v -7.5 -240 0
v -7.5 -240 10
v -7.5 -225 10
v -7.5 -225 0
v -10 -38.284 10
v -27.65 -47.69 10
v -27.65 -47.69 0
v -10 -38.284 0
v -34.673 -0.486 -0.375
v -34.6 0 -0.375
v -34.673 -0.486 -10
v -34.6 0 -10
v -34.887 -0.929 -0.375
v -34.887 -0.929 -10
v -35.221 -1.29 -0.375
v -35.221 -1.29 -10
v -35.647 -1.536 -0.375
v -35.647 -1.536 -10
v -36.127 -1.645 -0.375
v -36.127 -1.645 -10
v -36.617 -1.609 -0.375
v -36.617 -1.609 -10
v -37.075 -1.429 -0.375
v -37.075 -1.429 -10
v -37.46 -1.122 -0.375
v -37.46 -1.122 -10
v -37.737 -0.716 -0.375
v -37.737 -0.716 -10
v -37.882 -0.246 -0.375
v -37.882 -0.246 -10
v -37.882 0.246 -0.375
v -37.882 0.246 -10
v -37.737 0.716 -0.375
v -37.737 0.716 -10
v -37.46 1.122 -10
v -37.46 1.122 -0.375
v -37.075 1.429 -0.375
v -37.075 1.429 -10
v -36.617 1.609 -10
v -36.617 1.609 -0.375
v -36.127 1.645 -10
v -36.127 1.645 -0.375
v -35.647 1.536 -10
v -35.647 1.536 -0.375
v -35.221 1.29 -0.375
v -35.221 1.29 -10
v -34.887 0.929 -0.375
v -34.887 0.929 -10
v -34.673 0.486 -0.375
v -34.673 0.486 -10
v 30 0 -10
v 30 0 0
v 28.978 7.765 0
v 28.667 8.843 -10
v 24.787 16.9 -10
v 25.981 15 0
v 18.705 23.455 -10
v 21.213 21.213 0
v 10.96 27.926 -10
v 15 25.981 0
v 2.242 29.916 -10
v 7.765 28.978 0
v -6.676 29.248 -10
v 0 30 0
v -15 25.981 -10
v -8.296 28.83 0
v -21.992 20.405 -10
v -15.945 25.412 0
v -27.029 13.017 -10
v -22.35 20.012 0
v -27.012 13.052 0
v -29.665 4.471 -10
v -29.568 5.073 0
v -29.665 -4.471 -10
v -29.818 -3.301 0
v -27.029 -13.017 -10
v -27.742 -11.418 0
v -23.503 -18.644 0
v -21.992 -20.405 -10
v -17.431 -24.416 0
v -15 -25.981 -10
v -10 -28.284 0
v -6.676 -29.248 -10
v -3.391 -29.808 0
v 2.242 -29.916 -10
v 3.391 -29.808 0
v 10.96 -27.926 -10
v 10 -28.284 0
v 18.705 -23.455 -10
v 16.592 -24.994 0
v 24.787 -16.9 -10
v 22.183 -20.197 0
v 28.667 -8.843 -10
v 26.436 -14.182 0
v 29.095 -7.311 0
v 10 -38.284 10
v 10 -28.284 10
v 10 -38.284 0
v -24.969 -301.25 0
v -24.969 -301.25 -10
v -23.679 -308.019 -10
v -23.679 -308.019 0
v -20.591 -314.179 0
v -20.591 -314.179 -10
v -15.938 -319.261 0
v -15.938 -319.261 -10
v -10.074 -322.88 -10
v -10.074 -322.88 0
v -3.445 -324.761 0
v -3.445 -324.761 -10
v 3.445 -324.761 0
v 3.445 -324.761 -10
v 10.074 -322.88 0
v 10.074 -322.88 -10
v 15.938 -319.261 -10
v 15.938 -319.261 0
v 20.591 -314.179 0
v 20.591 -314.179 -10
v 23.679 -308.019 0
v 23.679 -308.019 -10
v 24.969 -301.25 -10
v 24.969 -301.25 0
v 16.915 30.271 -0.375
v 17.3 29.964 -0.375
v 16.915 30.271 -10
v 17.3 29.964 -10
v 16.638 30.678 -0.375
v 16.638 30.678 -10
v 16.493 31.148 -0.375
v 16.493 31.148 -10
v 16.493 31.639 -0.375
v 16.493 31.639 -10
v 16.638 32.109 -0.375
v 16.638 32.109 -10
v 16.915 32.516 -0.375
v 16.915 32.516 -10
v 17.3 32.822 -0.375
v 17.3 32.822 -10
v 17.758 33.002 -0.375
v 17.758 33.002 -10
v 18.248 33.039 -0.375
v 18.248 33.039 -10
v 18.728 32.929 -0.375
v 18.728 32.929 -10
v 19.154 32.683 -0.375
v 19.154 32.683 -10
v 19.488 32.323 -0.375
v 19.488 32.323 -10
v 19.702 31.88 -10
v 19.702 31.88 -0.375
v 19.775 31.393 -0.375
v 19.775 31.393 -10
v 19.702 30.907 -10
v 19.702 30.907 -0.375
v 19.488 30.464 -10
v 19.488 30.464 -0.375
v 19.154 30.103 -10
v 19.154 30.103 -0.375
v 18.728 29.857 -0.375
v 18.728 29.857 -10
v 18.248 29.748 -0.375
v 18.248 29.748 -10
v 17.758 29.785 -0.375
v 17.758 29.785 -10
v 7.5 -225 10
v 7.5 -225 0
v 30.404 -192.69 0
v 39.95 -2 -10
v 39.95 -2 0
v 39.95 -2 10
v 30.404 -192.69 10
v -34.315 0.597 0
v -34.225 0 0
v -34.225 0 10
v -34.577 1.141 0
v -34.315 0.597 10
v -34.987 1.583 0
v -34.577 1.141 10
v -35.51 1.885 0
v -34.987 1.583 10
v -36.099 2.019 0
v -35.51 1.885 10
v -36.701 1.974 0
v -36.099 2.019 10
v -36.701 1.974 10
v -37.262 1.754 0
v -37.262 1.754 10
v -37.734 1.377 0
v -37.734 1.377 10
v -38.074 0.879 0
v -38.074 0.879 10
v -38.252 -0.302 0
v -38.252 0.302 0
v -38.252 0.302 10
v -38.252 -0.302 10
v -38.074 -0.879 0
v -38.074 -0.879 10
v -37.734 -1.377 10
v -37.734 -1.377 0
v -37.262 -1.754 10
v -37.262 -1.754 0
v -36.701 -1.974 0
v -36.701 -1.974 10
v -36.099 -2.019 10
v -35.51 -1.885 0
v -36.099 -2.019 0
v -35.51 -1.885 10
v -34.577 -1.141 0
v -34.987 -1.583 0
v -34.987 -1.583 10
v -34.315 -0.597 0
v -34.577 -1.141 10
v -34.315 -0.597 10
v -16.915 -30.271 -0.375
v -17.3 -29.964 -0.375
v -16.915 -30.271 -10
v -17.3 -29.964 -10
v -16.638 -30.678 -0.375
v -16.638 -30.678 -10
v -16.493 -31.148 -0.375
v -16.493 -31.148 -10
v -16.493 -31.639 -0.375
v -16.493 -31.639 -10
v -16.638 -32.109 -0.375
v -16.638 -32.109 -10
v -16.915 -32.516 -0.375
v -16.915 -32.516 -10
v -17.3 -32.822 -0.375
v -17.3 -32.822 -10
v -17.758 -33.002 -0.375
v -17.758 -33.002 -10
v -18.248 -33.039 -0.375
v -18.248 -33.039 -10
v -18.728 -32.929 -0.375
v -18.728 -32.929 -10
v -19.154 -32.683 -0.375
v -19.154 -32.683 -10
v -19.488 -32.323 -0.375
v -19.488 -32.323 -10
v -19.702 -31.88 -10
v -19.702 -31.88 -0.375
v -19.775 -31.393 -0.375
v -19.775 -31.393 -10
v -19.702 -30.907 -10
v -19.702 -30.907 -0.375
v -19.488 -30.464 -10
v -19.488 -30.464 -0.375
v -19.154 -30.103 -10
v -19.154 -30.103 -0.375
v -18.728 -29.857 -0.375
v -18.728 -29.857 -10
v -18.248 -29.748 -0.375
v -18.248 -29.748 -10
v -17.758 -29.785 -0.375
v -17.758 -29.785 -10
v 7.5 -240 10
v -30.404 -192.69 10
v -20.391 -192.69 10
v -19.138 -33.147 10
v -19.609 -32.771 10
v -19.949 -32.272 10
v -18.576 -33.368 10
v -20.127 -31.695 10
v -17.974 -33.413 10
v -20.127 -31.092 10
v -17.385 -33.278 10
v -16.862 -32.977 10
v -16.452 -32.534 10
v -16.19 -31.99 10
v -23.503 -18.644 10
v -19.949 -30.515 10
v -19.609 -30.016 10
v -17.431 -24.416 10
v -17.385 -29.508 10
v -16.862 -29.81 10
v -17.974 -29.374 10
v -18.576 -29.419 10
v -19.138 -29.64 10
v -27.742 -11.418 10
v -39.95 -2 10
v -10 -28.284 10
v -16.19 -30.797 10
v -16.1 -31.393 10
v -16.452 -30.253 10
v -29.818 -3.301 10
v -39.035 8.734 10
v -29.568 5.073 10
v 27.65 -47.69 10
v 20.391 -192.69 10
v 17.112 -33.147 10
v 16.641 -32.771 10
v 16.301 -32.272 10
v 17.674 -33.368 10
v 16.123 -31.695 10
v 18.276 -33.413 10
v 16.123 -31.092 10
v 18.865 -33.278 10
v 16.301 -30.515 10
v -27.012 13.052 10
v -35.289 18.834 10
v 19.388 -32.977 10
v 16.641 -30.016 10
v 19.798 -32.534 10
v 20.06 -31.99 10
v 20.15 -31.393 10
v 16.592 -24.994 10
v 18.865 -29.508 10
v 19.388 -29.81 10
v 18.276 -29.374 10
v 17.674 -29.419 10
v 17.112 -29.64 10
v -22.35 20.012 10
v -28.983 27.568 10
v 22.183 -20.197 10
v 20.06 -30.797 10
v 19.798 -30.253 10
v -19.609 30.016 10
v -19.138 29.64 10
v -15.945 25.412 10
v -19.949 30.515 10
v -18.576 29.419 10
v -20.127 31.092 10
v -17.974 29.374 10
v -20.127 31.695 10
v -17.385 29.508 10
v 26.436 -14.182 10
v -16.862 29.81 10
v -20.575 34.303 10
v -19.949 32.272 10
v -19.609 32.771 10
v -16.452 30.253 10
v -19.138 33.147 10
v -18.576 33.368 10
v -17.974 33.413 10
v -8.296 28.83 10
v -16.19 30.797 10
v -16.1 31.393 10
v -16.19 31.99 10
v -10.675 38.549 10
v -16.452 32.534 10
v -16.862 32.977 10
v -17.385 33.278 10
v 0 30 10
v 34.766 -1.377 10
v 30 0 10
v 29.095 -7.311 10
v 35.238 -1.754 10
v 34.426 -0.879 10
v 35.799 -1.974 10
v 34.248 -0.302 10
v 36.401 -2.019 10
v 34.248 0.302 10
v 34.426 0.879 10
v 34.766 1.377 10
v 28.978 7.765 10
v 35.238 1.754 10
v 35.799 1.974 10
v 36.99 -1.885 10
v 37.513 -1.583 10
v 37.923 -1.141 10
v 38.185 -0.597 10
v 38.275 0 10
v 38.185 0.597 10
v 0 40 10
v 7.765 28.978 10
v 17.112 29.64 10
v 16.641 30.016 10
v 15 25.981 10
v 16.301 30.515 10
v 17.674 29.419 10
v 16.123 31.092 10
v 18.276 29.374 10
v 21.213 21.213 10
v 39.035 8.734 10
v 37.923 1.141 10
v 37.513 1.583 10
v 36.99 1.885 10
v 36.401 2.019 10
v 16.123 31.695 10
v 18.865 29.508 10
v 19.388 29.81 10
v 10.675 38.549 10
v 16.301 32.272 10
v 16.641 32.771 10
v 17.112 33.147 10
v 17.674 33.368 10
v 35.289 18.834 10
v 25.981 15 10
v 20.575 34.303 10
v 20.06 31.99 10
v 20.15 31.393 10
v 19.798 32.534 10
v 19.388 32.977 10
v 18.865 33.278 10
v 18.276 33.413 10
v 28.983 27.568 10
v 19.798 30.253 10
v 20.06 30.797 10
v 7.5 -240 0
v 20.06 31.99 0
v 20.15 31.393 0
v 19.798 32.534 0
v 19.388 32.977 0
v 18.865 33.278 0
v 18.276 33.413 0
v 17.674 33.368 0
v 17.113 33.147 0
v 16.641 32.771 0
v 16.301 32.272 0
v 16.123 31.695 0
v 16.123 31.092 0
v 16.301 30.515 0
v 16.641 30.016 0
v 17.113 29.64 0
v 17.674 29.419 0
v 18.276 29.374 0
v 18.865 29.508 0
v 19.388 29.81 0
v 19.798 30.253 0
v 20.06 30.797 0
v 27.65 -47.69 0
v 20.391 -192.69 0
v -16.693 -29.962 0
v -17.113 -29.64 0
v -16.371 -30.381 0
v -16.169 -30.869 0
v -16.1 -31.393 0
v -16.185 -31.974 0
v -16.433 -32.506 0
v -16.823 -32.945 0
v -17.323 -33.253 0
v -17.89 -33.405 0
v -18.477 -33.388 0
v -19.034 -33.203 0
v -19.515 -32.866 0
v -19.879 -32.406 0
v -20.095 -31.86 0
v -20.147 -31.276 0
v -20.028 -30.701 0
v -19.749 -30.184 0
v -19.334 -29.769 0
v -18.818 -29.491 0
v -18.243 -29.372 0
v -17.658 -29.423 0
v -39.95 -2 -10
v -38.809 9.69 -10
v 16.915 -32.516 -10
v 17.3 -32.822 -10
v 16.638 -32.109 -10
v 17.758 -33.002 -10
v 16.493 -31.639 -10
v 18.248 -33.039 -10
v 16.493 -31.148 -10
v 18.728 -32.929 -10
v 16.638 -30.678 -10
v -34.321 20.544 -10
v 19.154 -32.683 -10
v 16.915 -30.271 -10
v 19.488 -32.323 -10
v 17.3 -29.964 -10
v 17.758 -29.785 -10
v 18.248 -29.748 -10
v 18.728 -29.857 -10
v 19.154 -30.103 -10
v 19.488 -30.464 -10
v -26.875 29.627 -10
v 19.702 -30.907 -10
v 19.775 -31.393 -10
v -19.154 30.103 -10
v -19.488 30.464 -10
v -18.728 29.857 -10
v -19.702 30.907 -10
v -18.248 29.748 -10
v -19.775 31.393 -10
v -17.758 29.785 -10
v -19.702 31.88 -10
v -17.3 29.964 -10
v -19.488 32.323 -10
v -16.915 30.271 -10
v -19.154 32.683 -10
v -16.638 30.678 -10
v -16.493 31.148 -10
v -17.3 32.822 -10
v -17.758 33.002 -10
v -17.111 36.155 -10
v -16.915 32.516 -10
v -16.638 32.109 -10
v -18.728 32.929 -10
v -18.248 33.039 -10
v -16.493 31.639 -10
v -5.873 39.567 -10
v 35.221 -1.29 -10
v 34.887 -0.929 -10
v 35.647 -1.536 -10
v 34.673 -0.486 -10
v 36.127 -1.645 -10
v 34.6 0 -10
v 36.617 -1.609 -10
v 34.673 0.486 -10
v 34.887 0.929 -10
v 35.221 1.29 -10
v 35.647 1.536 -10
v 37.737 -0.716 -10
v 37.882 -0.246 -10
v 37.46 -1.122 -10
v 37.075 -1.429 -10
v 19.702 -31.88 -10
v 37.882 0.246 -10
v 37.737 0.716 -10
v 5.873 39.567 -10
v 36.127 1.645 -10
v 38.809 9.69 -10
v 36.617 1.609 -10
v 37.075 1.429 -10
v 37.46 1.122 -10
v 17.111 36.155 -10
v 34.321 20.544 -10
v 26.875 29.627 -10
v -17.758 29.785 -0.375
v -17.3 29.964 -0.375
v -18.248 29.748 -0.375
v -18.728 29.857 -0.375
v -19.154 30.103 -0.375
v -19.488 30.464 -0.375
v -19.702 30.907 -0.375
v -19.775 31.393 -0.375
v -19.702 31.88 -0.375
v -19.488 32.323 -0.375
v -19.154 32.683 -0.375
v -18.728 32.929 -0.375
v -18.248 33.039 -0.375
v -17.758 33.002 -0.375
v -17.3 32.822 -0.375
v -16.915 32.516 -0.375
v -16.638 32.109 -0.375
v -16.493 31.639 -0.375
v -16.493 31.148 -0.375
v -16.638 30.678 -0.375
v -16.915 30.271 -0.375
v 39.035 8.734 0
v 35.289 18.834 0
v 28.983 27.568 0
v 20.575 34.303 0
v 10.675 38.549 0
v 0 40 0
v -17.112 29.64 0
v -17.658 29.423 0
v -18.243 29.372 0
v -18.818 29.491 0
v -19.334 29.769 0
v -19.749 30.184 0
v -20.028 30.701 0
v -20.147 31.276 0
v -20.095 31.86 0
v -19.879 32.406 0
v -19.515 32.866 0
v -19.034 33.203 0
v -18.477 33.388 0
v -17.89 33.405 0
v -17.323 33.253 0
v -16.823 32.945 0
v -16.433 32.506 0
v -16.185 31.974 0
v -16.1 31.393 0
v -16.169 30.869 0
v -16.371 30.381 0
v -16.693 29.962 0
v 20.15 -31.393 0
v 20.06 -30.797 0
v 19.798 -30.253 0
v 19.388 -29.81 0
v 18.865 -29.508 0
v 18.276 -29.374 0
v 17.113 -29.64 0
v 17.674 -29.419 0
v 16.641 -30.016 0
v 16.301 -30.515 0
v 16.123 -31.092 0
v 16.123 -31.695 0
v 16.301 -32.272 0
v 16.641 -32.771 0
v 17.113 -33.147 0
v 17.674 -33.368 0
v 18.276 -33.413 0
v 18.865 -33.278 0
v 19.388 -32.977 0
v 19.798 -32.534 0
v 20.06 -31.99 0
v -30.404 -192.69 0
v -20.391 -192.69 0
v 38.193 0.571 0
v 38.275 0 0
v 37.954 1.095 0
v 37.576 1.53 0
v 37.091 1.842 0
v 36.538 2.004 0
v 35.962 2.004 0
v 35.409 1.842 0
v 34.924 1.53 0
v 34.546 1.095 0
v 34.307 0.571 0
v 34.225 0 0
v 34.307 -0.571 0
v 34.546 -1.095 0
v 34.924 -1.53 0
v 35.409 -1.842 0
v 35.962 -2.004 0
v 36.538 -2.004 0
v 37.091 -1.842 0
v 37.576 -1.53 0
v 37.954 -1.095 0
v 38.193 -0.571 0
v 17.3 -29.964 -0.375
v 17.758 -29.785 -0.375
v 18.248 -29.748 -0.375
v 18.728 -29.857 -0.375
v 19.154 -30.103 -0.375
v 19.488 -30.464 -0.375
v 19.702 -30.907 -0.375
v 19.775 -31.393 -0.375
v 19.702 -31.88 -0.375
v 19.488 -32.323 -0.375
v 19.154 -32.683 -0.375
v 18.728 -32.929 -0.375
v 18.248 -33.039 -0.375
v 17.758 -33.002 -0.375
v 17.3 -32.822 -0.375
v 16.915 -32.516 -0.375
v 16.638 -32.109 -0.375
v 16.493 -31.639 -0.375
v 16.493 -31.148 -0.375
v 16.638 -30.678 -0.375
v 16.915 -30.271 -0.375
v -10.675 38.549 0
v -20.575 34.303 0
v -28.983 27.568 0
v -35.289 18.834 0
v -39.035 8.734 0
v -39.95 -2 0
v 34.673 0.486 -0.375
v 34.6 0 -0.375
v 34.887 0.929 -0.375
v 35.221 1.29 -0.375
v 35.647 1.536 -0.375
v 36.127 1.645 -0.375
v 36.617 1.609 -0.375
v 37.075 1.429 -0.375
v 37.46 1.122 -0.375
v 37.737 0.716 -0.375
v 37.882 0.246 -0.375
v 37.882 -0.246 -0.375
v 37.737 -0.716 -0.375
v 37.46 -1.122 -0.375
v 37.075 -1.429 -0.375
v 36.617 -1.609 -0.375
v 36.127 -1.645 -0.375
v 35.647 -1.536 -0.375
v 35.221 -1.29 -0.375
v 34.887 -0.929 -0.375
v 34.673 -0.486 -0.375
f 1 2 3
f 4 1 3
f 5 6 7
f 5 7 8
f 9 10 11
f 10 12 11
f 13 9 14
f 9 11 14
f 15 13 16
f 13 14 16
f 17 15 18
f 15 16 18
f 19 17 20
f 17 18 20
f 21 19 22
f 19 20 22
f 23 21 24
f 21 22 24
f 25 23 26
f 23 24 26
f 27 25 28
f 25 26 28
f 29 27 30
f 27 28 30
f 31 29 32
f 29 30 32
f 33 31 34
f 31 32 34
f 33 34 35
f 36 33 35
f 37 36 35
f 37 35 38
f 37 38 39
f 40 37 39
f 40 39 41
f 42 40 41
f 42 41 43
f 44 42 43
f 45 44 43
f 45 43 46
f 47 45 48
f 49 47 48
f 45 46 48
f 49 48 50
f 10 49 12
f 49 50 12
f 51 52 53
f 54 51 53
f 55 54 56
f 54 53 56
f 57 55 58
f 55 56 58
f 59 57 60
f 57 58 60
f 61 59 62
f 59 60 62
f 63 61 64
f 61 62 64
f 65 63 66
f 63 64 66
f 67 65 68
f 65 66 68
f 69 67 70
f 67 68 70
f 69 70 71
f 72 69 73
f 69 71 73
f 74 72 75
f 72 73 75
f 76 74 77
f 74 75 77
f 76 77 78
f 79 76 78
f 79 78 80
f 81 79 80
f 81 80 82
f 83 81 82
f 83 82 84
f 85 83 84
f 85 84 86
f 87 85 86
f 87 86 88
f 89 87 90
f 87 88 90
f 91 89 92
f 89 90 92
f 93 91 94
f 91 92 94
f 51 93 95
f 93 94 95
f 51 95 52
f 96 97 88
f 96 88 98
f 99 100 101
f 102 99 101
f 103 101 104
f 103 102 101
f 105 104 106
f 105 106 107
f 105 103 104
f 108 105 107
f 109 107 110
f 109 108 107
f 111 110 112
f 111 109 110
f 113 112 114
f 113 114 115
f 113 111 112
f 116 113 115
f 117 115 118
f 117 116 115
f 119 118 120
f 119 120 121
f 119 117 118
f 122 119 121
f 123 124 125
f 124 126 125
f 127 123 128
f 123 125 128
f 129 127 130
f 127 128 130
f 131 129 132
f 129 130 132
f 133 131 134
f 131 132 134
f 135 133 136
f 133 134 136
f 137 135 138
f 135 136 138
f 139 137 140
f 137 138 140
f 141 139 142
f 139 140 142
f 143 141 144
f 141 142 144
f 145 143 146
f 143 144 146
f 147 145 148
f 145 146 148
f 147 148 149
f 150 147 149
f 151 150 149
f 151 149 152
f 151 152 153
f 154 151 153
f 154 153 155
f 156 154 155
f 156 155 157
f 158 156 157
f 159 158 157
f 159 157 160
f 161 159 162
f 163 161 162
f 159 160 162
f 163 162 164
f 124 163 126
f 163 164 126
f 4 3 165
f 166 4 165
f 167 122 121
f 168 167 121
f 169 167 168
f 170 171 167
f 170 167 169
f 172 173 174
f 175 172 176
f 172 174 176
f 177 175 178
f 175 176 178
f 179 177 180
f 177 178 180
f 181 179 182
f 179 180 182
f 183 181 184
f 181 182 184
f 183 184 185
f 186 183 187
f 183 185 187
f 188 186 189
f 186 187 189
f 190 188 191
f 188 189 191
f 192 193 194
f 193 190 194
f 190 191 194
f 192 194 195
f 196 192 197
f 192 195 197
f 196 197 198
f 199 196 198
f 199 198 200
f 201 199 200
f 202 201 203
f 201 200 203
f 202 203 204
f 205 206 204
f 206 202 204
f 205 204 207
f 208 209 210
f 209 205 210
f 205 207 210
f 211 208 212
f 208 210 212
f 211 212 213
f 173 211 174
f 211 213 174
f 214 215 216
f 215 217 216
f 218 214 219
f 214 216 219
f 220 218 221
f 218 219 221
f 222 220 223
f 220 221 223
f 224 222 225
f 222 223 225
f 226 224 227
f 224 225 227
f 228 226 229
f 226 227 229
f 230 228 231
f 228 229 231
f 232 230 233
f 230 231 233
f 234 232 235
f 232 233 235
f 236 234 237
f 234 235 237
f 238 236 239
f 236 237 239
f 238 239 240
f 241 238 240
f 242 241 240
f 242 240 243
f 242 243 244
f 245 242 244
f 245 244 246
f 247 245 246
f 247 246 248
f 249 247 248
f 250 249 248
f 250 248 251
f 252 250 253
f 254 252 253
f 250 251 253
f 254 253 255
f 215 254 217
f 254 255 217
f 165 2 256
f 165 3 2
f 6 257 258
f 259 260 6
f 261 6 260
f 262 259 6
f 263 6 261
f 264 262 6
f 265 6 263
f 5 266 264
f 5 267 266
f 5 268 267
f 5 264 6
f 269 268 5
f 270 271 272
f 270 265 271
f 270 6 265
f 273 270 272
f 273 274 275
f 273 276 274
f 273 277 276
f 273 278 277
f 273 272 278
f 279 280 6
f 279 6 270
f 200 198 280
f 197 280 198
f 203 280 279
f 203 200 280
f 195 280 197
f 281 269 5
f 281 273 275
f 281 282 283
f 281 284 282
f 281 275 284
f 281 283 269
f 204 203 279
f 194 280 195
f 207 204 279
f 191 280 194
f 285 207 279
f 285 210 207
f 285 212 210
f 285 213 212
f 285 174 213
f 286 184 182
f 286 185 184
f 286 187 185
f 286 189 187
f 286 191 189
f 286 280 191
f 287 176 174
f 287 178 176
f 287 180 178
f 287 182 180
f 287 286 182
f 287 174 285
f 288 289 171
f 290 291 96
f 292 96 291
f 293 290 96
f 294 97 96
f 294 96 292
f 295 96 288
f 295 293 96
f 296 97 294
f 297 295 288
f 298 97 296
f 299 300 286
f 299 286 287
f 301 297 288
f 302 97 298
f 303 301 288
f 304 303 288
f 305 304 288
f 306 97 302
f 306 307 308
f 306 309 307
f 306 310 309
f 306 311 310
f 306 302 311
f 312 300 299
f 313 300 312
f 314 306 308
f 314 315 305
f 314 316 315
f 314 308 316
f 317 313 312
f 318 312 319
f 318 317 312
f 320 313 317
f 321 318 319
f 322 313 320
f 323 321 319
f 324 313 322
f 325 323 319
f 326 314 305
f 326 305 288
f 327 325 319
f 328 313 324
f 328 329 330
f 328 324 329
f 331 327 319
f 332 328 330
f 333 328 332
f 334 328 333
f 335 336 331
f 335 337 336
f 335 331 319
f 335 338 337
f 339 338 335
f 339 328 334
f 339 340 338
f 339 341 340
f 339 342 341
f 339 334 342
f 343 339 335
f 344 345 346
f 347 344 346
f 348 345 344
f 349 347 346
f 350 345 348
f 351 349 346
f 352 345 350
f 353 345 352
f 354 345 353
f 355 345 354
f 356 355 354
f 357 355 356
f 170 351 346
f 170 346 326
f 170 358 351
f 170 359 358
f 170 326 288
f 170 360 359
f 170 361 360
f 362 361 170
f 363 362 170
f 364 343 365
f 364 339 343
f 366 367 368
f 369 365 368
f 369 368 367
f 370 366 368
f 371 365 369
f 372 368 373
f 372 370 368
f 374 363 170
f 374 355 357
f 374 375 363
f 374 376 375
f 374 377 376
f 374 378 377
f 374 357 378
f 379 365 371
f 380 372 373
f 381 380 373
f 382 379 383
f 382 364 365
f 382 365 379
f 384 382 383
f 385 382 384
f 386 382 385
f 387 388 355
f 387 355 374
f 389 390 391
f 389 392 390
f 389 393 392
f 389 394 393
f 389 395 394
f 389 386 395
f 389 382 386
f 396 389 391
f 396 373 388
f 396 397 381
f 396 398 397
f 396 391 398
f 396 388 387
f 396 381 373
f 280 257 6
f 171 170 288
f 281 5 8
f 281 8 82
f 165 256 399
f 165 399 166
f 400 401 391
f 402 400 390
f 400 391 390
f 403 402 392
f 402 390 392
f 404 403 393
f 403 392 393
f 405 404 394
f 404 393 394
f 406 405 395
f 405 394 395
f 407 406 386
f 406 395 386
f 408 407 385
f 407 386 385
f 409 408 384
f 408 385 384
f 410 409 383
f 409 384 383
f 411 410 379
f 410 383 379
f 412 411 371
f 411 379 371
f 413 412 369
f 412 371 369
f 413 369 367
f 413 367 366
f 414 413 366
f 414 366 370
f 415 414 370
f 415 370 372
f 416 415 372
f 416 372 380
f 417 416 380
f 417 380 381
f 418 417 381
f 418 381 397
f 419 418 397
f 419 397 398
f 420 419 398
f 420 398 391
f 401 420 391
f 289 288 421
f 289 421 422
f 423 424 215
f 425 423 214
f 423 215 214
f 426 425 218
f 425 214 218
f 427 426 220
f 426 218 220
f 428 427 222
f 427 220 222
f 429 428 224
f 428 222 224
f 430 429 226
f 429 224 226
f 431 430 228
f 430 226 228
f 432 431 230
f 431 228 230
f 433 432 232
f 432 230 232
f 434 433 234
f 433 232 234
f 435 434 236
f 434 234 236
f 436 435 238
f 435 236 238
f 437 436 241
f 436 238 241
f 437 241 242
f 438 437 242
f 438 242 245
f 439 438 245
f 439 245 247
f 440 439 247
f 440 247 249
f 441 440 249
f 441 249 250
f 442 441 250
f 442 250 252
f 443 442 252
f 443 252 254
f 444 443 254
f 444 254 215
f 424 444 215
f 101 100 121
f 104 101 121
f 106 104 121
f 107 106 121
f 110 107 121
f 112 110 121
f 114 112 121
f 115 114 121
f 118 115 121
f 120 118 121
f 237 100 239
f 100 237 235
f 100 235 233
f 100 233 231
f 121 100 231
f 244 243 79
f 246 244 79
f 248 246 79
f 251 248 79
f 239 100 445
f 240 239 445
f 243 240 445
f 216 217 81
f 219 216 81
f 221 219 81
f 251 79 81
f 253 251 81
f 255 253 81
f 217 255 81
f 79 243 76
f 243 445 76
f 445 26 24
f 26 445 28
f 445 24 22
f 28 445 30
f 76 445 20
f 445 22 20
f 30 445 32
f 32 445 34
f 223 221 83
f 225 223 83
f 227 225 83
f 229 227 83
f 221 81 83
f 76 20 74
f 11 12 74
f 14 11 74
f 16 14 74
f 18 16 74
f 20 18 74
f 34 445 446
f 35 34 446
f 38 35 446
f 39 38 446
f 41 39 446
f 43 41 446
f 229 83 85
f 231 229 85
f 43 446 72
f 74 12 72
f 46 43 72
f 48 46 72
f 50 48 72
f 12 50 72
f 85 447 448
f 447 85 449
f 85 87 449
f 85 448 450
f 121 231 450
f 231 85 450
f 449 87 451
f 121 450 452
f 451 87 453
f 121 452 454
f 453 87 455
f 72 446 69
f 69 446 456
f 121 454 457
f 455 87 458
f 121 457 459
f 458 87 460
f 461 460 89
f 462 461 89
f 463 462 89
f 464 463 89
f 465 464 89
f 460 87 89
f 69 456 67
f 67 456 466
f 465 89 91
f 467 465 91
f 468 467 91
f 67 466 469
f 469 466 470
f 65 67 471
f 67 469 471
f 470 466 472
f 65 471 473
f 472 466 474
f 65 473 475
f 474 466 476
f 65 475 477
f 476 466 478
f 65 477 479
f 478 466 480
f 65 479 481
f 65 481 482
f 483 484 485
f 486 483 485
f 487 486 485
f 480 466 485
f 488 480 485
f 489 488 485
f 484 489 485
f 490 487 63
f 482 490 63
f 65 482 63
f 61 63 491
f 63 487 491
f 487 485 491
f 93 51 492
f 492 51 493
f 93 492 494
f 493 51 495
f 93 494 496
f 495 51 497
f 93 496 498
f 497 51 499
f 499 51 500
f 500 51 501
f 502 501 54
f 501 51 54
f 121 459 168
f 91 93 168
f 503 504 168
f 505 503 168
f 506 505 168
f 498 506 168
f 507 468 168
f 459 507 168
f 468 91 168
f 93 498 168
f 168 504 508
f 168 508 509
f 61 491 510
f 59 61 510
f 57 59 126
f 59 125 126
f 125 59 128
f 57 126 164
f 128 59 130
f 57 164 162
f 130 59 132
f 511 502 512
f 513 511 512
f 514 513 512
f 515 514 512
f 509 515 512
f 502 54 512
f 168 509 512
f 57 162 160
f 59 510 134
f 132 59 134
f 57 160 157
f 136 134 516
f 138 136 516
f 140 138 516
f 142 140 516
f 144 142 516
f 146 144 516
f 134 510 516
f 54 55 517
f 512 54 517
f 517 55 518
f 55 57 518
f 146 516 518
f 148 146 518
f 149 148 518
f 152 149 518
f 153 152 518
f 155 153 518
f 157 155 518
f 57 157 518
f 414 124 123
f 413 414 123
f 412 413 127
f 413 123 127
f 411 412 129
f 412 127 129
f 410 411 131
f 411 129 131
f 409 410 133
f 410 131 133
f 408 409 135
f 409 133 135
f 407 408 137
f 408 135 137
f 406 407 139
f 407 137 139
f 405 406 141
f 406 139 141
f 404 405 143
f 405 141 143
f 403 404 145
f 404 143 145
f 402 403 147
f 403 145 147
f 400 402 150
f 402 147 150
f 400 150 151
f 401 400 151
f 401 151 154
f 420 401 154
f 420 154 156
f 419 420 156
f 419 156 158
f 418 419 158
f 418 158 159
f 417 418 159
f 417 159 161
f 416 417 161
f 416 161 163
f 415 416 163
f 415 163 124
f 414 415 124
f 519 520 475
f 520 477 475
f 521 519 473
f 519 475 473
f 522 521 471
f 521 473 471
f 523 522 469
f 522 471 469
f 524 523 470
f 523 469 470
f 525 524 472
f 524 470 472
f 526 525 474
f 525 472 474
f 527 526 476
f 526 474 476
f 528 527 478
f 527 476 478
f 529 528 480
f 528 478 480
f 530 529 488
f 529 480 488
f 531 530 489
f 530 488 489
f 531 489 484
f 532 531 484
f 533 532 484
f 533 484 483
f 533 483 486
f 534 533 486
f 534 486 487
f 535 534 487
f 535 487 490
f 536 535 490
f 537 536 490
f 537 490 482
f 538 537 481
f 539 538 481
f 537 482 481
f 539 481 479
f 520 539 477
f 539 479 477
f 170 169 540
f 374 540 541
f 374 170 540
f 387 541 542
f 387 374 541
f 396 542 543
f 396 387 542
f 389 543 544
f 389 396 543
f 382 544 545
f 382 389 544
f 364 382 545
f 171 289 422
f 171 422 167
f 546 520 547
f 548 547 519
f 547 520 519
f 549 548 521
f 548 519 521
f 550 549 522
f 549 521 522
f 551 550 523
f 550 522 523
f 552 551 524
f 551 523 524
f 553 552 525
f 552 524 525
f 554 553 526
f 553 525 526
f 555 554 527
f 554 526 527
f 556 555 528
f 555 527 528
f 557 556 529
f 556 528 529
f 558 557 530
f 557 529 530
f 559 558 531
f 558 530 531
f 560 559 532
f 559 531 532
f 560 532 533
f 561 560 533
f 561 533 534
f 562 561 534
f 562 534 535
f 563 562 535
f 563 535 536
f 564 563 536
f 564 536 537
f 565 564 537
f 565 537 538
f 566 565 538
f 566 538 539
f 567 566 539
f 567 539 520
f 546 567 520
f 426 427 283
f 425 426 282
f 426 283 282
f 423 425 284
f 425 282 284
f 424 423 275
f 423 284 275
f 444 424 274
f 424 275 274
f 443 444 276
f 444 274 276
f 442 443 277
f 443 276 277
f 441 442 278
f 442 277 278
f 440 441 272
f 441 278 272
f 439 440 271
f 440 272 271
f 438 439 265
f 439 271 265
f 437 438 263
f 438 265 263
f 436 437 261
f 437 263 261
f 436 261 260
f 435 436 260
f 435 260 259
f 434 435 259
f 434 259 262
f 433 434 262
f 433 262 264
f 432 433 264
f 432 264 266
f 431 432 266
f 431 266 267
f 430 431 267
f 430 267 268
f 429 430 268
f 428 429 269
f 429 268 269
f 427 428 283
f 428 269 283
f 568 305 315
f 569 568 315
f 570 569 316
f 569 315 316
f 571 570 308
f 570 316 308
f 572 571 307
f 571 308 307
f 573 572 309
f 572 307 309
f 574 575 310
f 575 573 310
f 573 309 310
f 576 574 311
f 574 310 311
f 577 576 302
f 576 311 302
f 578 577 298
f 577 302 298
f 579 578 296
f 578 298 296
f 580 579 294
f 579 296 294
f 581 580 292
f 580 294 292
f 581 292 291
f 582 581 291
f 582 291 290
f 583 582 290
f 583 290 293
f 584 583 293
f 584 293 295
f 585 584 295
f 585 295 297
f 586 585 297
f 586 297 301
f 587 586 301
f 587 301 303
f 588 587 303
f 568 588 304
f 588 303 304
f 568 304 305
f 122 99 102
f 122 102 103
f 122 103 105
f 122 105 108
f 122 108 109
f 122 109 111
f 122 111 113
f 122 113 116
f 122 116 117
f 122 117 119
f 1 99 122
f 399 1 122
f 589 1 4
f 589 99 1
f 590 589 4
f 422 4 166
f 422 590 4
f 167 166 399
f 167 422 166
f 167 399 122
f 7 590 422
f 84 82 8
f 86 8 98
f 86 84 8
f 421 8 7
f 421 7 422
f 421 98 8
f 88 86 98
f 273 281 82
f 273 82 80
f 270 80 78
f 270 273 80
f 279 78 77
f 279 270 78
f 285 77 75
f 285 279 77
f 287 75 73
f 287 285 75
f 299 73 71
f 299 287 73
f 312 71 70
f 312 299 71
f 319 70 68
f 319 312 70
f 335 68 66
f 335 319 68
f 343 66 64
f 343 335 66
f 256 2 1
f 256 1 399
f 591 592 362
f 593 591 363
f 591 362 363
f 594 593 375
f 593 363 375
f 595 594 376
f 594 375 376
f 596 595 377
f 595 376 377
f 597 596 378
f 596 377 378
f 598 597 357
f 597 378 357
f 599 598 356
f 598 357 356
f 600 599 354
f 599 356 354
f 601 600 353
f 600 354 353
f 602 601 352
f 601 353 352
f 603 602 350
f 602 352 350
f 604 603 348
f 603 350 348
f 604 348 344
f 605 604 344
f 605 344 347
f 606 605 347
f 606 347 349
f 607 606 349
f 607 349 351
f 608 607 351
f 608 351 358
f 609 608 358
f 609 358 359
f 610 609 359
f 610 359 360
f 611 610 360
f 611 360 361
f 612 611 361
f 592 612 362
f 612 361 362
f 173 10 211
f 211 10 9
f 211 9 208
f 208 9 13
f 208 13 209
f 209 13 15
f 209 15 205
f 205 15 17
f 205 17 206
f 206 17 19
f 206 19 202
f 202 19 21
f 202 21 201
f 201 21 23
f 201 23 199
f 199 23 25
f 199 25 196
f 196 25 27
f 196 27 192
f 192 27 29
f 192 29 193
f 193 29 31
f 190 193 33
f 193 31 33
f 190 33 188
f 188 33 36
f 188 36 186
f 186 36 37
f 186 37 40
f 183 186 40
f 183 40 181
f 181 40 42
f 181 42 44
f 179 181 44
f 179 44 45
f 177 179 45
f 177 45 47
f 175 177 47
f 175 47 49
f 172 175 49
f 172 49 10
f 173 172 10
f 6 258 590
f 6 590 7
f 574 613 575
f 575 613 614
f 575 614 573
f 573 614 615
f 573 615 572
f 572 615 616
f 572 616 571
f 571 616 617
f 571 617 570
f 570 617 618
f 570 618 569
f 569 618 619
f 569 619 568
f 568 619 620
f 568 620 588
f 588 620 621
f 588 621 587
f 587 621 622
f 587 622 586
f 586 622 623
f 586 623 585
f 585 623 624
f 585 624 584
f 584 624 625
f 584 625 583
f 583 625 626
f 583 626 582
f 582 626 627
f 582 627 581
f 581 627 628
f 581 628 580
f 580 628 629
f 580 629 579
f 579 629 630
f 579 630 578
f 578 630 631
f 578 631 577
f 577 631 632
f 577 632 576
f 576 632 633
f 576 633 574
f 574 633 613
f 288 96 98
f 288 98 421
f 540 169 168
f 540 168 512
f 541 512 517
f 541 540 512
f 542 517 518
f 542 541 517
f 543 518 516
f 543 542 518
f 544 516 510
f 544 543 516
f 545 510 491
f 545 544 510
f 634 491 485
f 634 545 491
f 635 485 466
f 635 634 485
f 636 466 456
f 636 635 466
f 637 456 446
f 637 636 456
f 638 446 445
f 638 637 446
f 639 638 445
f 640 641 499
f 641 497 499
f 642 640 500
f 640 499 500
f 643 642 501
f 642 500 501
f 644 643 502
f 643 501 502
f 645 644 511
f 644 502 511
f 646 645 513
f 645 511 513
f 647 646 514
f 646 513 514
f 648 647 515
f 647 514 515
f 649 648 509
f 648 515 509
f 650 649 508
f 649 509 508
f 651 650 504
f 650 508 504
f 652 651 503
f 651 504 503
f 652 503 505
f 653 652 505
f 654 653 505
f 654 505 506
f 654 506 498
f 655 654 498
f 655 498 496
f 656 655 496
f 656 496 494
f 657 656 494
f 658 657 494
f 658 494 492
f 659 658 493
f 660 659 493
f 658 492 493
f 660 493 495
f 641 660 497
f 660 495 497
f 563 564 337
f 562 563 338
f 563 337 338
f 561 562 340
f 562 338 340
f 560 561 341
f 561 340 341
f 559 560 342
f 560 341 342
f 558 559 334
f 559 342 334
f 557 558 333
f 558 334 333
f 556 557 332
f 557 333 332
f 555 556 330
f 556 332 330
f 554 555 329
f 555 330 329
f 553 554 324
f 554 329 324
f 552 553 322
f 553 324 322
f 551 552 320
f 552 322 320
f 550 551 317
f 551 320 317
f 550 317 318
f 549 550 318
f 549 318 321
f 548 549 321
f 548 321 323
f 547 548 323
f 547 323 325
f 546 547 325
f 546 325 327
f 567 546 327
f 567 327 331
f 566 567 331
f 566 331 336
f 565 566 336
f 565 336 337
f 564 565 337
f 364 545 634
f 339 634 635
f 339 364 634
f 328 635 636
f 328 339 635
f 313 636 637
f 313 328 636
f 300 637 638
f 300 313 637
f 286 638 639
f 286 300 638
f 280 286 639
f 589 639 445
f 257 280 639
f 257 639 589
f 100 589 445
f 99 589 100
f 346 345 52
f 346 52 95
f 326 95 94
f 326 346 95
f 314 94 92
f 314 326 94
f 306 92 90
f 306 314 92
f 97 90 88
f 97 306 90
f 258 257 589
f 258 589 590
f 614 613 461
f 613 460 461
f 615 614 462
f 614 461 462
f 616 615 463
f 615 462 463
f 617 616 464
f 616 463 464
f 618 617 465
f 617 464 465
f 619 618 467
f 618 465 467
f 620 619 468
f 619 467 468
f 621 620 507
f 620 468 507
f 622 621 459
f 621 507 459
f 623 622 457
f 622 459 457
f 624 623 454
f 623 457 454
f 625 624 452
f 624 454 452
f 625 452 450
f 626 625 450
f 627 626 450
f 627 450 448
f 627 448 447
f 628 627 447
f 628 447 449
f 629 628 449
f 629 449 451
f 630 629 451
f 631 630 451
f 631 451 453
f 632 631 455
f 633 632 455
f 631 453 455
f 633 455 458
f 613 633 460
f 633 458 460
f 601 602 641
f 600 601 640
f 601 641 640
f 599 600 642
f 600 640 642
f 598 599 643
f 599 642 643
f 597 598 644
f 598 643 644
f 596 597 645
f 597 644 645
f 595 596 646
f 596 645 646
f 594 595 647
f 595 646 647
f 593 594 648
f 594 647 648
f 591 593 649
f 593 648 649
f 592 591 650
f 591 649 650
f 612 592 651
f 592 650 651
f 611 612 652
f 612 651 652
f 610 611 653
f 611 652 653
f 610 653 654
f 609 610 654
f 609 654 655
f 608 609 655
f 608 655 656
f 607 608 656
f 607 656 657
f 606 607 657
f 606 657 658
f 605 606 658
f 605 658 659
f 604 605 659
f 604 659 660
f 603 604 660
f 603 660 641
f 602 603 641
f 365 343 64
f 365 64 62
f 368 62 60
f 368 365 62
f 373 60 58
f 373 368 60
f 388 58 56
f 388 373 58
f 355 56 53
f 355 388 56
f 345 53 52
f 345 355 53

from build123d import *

# Parameters (mm, degrees)
SKETCH1_R                       = 40
SKETCH1_R_2                     = 30
BOSS_EXTRUDE1_DEPTH             = 10
M4X0_7_TAPPED_HOLE1_D           = 3.3
M4X0_7_TAPPED_HOLE1_CSINK_D     = 4.05
M4X0_7_TAPPED_HOLE1_CSINK_ANGLE = 90
CIRPATTERN1_COUNT               = 6
SKETCH14_R                      = 25
BOSS_EXTRUDE5_DEPTH             = 10
BOSS_EXTRUDE7_START             = 10
SKETCH15_W                      = 7.5
SKETCH15_H                      = 15
SKETCH15_R                      = 2.025
BOSS_EXTRUDE7_DEPTH             = 10


with BuildPart() as part:
    # Sketch1 → Boss-Extrude1 (new body)
    with BuildSketch(Plane.XY):
        Circle(SKETCH1_R)
        Circle(SKETCH1_R_2, mode=Mode.SUBTRACT)
    extrude(amount=-BOSS_EXTRUDE1_DEPTH)

    # M4x0.7 Tapped Hole1 (through all)
    with Locations(Plane.XY):
        with Locations((36.25, 0)):
            m4x0_7_tapped_hole1 = CounterSinkHole(M4X0_7_TAPPED_HOLE1_D / 2, M4X0_7_TAPPED_HOLE1_CSINK_D / 2, counter_sink_angle=M4X0_7_TAPPED_HOLE1_CSINK_ANGLE)

    # CirPattern1: M4x0.7 Tapped Hole1 ×6 about axis
    cirpattern1_axis = Axis((0, 0, 0), (0, 0, 1))
    for i in range(1, CIRPATTERN1_COUNT):
        add(m4x0_7_tapped_hole1.rotate(cirpattern1_axis, i * 360 / CIRPATTERN1_COUNT), mode=Mode.SUBTRACT)

    # Sketch14 → Boss-Extrude5 (add)
    with BuildSketch(Plane.XY):
        with BuildLine():
            ThreePointArc((39.949968711, -2), (0, -40), (-39.949968711, -2))
            Line((-39.949968711, -2), (-24.968730444, -301.25))
            ThreePointArc((-24.968730444, -301.25), (-0.625195526, -275.007818612), (25, -300))
            ThreePointArc((25, -300), (24.992181388, -300.625195526), (24.968730444, -301.25))
            Line((24.968730444, -301.25), (39.949968711, -2))
        make_face()
        with Locations((0, -300)):
            Circle(SKETCH14_R)
    extrude(amount=-BOSS_EXTRUDE5_DEPTH)

    # Sketch15 → Boss-Extrude7 (add)
    # profile 1 of 4: a face of its own
    with BuildSketch(Plane.XY.offset(BOSS_EXTRUDE7_START)):
        with Locations((3.75, -232.5)):
            Rectangle(SKETCH15_W, SKETCH15_H)
    # profile 2 of 4: a face of its own
    with BuildSketch(Plane.XY.offset(BOSS_EXTRUDE7_START)):
        with Locations((-3.75, -232.5)):
            Rectangle(SKETCH15_W, SKETCH15_H)
    # profile 3 of 4: a face of its own
    with BuildSketch(Plane.XY.offset(BOSS_EXTRUDE7_START)):
        with BuildLine():
            Line((20.390984754, -192.690398552), (30.40350824, -192.690398552))
            Line((30.40350824, -192.690398552), (39.949968711, -2))
            ThreePointArc((39.949968711, -2), (28.982753492, 27.568097504), (0, 40))
            Line((0, 40), (0, 30))
            ThreePointArc((0, 30), (21.213203436, 21.213203436), (30, 0))
            ThreePointArc((30, 0), (24.494897428, -17.320508076), (10, -28.284271247))
            Line((10, -28.284271247), (10, -38.284271247))
            Line((10, -38.284271247), (27.650064281, -47.690398552))
            Line((27.650064281, -47.690398552), (20.390984754, -192.690398552))
        make_face()
        with Locations((18.125, -31.393420887)):
            Circle(SKETCH15_R, mode=Mode.SUBTRACT)
        with Locations((18.125, 31.393420887)):
            Circle(SKETCH15_R, mode=Mode.SUBTRACT)
        with Locations((36.25, 0)):
            Circle(SKETCH15_R, mode=Mode.SUBTRACT)
    # profile 4 of 4: a face of its own
    with BuildSketch(Plane.XY.offset(BOSS_EXTRUDE7_START)):
        with BuildLine():
            Line((-39.949968711, -2), (-30.40350824, -192.690398552))
            Line((-30.40350824, -192.690398552), (-20.390984754, -192.690398552))
            Line((-20.390984754, -192.690398552), (-27.650064281, -47.690398552))
            Line((-27.650064281, -47.690398552), (-10, -38.284271247))
            Line((-10, -38.284271247), (-10, -28.284271247))
            ThreePointArc((-10, -28.284271247), (-29.56795679, 5.073059362), (0, 30))
            Line((0, 30), (0, 40))
            ThreePointArc((0, 40), (-28.982753492, 27.568097504), (-39.949968711, -2))
        make_face()
        with Locations((-36.25, 0)):
            Circle(SKETCH15_R, mode=Mode.SUBTRACT)
        with Locations((-18.125, -31.393420887)):
            Circle(SKETCH15_R, mode=Mode.SUBTRACT)
        with Locations((-18.125, 31.393420887)):
            Circle(SKETCH15_R, mode=Mode.SUBTRACT)
    extrude(amount=-BOSS_EXTRUDE7_DEPTH)


solid = part.part
